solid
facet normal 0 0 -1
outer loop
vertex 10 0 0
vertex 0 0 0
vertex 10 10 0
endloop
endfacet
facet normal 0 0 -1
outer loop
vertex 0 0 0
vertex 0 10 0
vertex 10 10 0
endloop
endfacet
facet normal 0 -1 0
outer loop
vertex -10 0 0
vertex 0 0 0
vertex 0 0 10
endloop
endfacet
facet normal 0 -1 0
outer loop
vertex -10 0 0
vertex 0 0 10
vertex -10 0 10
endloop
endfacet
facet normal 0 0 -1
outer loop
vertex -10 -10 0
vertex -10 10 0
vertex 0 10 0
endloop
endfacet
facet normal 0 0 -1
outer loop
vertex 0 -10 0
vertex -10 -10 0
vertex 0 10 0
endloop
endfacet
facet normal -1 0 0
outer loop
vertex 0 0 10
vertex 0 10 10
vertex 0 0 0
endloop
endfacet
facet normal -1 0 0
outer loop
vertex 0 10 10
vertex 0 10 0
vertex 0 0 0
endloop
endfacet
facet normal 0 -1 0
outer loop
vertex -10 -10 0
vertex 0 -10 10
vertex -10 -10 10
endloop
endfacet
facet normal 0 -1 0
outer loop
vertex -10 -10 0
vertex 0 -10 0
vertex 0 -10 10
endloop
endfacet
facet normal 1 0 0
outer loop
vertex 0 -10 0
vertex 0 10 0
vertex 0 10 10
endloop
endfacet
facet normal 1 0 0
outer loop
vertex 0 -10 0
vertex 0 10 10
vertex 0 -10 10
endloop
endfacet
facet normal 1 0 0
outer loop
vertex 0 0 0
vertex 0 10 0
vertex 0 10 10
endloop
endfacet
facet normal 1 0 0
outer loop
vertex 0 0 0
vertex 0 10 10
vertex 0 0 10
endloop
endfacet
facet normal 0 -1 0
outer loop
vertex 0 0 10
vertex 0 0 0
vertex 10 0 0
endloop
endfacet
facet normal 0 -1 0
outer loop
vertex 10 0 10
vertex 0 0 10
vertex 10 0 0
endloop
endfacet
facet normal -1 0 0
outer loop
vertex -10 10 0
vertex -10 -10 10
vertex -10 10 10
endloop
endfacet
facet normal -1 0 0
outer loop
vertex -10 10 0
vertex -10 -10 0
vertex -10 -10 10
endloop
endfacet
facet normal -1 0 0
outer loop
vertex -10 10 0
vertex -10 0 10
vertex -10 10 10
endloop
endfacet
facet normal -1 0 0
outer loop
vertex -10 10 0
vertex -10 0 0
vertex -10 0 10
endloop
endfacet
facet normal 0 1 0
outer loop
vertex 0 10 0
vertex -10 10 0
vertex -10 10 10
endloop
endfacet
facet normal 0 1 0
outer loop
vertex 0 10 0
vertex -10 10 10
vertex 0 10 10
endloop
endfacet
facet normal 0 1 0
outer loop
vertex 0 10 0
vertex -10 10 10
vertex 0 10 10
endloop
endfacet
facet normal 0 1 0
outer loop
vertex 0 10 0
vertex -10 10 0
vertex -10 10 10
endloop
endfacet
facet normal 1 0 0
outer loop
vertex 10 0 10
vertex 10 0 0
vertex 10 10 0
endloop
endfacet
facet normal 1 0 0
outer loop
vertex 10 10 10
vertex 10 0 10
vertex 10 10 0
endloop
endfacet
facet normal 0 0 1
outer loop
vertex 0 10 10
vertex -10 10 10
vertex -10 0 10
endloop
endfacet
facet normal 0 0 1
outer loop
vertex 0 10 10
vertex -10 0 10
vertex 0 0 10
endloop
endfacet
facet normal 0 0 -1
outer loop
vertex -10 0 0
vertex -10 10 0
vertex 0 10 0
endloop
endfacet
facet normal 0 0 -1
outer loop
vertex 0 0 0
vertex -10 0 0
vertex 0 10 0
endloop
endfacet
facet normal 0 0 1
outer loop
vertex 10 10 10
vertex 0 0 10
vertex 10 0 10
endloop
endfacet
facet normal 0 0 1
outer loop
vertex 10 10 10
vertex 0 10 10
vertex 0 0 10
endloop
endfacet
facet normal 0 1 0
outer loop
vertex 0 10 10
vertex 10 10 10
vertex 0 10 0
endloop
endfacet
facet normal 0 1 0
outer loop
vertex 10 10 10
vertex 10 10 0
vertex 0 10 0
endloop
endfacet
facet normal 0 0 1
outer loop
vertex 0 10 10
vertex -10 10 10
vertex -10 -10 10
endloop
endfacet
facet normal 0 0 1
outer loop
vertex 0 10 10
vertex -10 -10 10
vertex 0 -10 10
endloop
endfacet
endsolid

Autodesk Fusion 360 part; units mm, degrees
sketch "Sketch1" plane through (0, 0, 0) normal (0, 0, 1) x (1, 0, 0)
  line L0 (0, 0) -> (-10, 0)
  line L1 (-10, 0) -> (-10, 10)
  line L2 (-10, 10) -> (0, 10)
  line L3 (0, 10) -> (0, 0)
  line L4 (0, 0) -> (10, 0)
  line L5 (10, 0) -> (10, 10)
  line L6 (10, 10) -> (0, 10)
  line L7 (0, 10) -> (0, 0)
  line L8 (-10, 10) -> (0, 10)
  line L9 (0, 10) -> (0, -10)
  line L10 (0, -10) -> (-10, -10)
  line L11 (-10, -10) -> (-10, 10)
extrude "Extrude1" add sketch "Sketch1" along normal blind 10 contours L3 L4 L5 L6 L7 L9 makes body 1
extrude "Extrude2" add sketch "Sketch1" along normal blind 10 separate body contours L0 L1 L2 L3 L7 L8 L9 L11 makes body 2
extrude "Extrude3" add sketch "Sketch1" along normal blind 10 separate body contours L0 L9 L10 L11 | L0 L1 L2 L3 L7 L8 L9 L11 makes body 3
